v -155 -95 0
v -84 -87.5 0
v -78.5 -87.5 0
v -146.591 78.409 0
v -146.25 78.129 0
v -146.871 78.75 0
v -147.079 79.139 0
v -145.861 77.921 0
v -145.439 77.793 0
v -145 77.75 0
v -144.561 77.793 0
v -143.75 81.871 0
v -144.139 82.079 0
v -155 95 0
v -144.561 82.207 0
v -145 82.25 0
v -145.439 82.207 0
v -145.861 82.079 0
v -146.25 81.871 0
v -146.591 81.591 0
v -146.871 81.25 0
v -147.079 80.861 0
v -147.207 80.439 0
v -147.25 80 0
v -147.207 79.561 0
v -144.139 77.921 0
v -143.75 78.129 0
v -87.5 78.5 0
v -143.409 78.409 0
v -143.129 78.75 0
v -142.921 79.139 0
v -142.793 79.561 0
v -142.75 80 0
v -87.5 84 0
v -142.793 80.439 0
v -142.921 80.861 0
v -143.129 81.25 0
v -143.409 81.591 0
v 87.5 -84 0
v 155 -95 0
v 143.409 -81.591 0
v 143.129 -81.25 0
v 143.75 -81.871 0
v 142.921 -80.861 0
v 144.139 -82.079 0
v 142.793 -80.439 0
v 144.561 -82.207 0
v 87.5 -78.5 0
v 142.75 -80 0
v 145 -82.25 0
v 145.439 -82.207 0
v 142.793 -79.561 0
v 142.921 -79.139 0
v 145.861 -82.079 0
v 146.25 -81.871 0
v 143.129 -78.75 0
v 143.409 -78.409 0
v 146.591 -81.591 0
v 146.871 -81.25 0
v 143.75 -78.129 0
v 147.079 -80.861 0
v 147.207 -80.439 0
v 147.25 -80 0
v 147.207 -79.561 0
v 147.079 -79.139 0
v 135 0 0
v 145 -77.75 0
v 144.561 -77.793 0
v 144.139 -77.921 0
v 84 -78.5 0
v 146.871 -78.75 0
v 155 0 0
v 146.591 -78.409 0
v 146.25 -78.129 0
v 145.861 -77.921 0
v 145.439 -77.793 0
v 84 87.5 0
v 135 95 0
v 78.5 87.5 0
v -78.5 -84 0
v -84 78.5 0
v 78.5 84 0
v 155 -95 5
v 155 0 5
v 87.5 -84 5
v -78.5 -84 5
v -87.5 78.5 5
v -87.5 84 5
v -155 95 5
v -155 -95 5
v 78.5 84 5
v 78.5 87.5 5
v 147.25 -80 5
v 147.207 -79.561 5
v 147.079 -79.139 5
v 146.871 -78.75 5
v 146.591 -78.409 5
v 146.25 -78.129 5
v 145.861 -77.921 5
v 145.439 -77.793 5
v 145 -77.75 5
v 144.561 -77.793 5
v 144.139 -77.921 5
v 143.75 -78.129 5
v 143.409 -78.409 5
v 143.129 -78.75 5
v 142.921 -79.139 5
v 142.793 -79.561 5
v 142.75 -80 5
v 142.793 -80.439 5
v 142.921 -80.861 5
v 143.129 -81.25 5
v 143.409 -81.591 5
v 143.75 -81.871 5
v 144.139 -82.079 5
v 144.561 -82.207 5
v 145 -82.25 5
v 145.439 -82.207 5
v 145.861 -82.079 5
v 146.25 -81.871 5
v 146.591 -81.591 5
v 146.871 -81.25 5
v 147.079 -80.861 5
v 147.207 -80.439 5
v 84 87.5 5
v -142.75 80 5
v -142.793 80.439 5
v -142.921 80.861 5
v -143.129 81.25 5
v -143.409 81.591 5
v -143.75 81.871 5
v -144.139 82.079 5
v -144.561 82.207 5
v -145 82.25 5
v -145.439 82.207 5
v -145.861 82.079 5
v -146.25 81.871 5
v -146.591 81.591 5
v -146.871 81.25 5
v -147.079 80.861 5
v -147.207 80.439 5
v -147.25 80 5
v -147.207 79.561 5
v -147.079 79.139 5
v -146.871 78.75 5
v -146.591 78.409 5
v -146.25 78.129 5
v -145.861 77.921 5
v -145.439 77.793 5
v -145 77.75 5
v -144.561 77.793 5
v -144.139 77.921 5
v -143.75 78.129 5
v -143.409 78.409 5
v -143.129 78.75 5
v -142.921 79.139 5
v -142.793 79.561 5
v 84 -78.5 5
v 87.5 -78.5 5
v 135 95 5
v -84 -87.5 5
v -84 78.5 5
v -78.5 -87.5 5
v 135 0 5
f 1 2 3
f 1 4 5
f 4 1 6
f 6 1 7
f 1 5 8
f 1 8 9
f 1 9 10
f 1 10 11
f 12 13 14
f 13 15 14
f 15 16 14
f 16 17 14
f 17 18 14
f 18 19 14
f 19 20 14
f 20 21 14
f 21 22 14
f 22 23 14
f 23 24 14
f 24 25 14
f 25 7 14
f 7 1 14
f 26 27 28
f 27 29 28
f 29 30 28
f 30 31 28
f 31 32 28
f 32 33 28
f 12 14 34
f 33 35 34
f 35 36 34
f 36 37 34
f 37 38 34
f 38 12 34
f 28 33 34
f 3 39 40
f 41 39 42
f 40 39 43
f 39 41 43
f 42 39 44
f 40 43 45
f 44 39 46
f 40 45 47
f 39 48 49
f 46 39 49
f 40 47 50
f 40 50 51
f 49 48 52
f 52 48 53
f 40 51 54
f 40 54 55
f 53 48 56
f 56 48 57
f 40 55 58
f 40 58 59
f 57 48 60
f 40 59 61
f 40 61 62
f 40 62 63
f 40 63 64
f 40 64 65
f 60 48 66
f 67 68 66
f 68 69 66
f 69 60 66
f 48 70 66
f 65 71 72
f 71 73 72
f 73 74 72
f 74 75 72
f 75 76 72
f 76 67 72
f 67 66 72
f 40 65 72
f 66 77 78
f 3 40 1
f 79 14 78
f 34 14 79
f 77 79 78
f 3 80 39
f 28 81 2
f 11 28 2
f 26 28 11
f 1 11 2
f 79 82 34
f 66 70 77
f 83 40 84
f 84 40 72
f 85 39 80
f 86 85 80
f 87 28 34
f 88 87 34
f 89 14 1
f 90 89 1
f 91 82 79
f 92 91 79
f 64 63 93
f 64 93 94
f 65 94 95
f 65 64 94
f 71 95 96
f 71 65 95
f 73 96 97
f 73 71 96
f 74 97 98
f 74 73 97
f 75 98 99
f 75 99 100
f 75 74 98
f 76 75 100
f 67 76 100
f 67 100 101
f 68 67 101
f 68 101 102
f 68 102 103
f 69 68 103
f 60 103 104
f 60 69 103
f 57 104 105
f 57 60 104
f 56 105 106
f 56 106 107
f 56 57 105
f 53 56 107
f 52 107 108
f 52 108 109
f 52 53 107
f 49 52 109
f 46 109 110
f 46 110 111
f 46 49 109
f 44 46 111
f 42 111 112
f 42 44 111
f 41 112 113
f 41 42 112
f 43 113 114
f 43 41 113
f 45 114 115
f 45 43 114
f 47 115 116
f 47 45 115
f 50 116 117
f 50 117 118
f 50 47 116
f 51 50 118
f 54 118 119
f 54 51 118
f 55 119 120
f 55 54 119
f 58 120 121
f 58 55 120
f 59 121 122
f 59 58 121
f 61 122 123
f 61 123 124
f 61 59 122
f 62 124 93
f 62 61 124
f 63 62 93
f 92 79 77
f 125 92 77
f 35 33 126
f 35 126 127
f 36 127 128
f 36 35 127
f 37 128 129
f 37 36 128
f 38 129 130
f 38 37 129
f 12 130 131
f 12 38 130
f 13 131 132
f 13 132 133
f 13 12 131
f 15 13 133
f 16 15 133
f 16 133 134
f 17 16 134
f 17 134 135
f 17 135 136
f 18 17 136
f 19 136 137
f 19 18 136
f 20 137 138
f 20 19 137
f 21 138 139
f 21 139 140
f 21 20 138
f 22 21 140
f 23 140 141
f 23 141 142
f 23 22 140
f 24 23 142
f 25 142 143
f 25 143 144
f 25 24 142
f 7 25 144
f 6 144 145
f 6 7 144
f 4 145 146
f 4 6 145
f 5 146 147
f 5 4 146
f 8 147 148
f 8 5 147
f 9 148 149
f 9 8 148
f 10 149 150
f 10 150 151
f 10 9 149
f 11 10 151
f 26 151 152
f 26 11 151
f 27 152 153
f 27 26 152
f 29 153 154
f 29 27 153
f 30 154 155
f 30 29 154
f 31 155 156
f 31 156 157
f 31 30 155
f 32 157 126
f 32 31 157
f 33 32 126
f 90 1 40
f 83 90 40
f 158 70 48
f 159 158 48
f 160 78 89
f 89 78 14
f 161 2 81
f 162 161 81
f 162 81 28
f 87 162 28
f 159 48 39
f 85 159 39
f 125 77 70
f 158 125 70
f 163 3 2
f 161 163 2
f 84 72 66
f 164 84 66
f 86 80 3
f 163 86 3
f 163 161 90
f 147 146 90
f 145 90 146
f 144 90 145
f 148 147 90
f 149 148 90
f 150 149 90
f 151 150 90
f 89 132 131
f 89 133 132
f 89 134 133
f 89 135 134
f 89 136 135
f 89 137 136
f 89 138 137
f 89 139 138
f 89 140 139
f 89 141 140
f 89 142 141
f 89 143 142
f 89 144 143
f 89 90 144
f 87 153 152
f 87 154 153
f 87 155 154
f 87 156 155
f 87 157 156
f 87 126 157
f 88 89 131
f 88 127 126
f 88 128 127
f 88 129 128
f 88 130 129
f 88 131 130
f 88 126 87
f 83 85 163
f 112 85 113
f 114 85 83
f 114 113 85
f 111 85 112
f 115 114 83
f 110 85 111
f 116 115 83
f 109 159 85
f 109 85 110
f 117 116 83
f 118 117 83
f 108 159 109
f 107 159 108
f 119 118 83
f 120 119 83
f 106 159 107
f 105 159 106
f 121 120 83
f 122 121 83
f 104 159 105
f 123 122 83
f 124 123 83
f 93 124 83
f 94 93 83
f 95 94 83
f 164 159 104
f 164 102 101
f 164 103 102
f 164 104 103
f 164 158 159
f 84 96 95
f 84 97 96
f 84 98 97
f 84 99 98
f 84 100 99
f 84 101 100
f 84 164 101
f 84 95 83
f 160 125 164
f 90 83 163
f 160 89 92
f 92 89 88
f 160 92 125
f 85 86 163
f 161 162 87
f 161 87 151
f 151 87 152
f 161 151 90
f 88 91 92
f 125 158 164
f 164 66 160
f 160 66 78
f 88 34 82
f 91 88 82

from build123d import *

# Parameters (mm, degrees)
F0_R     = 2.25
F1_DEPTH = 5


with BuildPart() as f1:
    # F0 (on Top) → F1 (new body)
    with BuildSketch(Plane.XY):
        Polygon((-155, -95), (155, -95), (155, 0), (135, 0), (135, 95), (-155, 95), align=None)
        with Locations((145, -80)):
            Circle(F0_R, mode=Mode.SUBTRACT)
        Polygon((87.5, -84), (84, -84), (-78.5, -84), (-78.5, -87.5), (-84, -87.5), (-84, -84), (-84, 78.5), (-87.5, 78.5), (-87.5, 84), (-84, 84), (78.5, 84), (78.5, 87.5), (84, 87.5), (84, 84), (84, -78.5), (87.5, -78.5), align=None, mode=Mode.SUBTRACT)
        with Locations((-145, 80)):
            Circle(F0_R, mode=Mode.SUBTRACT)
    extrude(amount=F1_DEPTH)


solid = f1.part
